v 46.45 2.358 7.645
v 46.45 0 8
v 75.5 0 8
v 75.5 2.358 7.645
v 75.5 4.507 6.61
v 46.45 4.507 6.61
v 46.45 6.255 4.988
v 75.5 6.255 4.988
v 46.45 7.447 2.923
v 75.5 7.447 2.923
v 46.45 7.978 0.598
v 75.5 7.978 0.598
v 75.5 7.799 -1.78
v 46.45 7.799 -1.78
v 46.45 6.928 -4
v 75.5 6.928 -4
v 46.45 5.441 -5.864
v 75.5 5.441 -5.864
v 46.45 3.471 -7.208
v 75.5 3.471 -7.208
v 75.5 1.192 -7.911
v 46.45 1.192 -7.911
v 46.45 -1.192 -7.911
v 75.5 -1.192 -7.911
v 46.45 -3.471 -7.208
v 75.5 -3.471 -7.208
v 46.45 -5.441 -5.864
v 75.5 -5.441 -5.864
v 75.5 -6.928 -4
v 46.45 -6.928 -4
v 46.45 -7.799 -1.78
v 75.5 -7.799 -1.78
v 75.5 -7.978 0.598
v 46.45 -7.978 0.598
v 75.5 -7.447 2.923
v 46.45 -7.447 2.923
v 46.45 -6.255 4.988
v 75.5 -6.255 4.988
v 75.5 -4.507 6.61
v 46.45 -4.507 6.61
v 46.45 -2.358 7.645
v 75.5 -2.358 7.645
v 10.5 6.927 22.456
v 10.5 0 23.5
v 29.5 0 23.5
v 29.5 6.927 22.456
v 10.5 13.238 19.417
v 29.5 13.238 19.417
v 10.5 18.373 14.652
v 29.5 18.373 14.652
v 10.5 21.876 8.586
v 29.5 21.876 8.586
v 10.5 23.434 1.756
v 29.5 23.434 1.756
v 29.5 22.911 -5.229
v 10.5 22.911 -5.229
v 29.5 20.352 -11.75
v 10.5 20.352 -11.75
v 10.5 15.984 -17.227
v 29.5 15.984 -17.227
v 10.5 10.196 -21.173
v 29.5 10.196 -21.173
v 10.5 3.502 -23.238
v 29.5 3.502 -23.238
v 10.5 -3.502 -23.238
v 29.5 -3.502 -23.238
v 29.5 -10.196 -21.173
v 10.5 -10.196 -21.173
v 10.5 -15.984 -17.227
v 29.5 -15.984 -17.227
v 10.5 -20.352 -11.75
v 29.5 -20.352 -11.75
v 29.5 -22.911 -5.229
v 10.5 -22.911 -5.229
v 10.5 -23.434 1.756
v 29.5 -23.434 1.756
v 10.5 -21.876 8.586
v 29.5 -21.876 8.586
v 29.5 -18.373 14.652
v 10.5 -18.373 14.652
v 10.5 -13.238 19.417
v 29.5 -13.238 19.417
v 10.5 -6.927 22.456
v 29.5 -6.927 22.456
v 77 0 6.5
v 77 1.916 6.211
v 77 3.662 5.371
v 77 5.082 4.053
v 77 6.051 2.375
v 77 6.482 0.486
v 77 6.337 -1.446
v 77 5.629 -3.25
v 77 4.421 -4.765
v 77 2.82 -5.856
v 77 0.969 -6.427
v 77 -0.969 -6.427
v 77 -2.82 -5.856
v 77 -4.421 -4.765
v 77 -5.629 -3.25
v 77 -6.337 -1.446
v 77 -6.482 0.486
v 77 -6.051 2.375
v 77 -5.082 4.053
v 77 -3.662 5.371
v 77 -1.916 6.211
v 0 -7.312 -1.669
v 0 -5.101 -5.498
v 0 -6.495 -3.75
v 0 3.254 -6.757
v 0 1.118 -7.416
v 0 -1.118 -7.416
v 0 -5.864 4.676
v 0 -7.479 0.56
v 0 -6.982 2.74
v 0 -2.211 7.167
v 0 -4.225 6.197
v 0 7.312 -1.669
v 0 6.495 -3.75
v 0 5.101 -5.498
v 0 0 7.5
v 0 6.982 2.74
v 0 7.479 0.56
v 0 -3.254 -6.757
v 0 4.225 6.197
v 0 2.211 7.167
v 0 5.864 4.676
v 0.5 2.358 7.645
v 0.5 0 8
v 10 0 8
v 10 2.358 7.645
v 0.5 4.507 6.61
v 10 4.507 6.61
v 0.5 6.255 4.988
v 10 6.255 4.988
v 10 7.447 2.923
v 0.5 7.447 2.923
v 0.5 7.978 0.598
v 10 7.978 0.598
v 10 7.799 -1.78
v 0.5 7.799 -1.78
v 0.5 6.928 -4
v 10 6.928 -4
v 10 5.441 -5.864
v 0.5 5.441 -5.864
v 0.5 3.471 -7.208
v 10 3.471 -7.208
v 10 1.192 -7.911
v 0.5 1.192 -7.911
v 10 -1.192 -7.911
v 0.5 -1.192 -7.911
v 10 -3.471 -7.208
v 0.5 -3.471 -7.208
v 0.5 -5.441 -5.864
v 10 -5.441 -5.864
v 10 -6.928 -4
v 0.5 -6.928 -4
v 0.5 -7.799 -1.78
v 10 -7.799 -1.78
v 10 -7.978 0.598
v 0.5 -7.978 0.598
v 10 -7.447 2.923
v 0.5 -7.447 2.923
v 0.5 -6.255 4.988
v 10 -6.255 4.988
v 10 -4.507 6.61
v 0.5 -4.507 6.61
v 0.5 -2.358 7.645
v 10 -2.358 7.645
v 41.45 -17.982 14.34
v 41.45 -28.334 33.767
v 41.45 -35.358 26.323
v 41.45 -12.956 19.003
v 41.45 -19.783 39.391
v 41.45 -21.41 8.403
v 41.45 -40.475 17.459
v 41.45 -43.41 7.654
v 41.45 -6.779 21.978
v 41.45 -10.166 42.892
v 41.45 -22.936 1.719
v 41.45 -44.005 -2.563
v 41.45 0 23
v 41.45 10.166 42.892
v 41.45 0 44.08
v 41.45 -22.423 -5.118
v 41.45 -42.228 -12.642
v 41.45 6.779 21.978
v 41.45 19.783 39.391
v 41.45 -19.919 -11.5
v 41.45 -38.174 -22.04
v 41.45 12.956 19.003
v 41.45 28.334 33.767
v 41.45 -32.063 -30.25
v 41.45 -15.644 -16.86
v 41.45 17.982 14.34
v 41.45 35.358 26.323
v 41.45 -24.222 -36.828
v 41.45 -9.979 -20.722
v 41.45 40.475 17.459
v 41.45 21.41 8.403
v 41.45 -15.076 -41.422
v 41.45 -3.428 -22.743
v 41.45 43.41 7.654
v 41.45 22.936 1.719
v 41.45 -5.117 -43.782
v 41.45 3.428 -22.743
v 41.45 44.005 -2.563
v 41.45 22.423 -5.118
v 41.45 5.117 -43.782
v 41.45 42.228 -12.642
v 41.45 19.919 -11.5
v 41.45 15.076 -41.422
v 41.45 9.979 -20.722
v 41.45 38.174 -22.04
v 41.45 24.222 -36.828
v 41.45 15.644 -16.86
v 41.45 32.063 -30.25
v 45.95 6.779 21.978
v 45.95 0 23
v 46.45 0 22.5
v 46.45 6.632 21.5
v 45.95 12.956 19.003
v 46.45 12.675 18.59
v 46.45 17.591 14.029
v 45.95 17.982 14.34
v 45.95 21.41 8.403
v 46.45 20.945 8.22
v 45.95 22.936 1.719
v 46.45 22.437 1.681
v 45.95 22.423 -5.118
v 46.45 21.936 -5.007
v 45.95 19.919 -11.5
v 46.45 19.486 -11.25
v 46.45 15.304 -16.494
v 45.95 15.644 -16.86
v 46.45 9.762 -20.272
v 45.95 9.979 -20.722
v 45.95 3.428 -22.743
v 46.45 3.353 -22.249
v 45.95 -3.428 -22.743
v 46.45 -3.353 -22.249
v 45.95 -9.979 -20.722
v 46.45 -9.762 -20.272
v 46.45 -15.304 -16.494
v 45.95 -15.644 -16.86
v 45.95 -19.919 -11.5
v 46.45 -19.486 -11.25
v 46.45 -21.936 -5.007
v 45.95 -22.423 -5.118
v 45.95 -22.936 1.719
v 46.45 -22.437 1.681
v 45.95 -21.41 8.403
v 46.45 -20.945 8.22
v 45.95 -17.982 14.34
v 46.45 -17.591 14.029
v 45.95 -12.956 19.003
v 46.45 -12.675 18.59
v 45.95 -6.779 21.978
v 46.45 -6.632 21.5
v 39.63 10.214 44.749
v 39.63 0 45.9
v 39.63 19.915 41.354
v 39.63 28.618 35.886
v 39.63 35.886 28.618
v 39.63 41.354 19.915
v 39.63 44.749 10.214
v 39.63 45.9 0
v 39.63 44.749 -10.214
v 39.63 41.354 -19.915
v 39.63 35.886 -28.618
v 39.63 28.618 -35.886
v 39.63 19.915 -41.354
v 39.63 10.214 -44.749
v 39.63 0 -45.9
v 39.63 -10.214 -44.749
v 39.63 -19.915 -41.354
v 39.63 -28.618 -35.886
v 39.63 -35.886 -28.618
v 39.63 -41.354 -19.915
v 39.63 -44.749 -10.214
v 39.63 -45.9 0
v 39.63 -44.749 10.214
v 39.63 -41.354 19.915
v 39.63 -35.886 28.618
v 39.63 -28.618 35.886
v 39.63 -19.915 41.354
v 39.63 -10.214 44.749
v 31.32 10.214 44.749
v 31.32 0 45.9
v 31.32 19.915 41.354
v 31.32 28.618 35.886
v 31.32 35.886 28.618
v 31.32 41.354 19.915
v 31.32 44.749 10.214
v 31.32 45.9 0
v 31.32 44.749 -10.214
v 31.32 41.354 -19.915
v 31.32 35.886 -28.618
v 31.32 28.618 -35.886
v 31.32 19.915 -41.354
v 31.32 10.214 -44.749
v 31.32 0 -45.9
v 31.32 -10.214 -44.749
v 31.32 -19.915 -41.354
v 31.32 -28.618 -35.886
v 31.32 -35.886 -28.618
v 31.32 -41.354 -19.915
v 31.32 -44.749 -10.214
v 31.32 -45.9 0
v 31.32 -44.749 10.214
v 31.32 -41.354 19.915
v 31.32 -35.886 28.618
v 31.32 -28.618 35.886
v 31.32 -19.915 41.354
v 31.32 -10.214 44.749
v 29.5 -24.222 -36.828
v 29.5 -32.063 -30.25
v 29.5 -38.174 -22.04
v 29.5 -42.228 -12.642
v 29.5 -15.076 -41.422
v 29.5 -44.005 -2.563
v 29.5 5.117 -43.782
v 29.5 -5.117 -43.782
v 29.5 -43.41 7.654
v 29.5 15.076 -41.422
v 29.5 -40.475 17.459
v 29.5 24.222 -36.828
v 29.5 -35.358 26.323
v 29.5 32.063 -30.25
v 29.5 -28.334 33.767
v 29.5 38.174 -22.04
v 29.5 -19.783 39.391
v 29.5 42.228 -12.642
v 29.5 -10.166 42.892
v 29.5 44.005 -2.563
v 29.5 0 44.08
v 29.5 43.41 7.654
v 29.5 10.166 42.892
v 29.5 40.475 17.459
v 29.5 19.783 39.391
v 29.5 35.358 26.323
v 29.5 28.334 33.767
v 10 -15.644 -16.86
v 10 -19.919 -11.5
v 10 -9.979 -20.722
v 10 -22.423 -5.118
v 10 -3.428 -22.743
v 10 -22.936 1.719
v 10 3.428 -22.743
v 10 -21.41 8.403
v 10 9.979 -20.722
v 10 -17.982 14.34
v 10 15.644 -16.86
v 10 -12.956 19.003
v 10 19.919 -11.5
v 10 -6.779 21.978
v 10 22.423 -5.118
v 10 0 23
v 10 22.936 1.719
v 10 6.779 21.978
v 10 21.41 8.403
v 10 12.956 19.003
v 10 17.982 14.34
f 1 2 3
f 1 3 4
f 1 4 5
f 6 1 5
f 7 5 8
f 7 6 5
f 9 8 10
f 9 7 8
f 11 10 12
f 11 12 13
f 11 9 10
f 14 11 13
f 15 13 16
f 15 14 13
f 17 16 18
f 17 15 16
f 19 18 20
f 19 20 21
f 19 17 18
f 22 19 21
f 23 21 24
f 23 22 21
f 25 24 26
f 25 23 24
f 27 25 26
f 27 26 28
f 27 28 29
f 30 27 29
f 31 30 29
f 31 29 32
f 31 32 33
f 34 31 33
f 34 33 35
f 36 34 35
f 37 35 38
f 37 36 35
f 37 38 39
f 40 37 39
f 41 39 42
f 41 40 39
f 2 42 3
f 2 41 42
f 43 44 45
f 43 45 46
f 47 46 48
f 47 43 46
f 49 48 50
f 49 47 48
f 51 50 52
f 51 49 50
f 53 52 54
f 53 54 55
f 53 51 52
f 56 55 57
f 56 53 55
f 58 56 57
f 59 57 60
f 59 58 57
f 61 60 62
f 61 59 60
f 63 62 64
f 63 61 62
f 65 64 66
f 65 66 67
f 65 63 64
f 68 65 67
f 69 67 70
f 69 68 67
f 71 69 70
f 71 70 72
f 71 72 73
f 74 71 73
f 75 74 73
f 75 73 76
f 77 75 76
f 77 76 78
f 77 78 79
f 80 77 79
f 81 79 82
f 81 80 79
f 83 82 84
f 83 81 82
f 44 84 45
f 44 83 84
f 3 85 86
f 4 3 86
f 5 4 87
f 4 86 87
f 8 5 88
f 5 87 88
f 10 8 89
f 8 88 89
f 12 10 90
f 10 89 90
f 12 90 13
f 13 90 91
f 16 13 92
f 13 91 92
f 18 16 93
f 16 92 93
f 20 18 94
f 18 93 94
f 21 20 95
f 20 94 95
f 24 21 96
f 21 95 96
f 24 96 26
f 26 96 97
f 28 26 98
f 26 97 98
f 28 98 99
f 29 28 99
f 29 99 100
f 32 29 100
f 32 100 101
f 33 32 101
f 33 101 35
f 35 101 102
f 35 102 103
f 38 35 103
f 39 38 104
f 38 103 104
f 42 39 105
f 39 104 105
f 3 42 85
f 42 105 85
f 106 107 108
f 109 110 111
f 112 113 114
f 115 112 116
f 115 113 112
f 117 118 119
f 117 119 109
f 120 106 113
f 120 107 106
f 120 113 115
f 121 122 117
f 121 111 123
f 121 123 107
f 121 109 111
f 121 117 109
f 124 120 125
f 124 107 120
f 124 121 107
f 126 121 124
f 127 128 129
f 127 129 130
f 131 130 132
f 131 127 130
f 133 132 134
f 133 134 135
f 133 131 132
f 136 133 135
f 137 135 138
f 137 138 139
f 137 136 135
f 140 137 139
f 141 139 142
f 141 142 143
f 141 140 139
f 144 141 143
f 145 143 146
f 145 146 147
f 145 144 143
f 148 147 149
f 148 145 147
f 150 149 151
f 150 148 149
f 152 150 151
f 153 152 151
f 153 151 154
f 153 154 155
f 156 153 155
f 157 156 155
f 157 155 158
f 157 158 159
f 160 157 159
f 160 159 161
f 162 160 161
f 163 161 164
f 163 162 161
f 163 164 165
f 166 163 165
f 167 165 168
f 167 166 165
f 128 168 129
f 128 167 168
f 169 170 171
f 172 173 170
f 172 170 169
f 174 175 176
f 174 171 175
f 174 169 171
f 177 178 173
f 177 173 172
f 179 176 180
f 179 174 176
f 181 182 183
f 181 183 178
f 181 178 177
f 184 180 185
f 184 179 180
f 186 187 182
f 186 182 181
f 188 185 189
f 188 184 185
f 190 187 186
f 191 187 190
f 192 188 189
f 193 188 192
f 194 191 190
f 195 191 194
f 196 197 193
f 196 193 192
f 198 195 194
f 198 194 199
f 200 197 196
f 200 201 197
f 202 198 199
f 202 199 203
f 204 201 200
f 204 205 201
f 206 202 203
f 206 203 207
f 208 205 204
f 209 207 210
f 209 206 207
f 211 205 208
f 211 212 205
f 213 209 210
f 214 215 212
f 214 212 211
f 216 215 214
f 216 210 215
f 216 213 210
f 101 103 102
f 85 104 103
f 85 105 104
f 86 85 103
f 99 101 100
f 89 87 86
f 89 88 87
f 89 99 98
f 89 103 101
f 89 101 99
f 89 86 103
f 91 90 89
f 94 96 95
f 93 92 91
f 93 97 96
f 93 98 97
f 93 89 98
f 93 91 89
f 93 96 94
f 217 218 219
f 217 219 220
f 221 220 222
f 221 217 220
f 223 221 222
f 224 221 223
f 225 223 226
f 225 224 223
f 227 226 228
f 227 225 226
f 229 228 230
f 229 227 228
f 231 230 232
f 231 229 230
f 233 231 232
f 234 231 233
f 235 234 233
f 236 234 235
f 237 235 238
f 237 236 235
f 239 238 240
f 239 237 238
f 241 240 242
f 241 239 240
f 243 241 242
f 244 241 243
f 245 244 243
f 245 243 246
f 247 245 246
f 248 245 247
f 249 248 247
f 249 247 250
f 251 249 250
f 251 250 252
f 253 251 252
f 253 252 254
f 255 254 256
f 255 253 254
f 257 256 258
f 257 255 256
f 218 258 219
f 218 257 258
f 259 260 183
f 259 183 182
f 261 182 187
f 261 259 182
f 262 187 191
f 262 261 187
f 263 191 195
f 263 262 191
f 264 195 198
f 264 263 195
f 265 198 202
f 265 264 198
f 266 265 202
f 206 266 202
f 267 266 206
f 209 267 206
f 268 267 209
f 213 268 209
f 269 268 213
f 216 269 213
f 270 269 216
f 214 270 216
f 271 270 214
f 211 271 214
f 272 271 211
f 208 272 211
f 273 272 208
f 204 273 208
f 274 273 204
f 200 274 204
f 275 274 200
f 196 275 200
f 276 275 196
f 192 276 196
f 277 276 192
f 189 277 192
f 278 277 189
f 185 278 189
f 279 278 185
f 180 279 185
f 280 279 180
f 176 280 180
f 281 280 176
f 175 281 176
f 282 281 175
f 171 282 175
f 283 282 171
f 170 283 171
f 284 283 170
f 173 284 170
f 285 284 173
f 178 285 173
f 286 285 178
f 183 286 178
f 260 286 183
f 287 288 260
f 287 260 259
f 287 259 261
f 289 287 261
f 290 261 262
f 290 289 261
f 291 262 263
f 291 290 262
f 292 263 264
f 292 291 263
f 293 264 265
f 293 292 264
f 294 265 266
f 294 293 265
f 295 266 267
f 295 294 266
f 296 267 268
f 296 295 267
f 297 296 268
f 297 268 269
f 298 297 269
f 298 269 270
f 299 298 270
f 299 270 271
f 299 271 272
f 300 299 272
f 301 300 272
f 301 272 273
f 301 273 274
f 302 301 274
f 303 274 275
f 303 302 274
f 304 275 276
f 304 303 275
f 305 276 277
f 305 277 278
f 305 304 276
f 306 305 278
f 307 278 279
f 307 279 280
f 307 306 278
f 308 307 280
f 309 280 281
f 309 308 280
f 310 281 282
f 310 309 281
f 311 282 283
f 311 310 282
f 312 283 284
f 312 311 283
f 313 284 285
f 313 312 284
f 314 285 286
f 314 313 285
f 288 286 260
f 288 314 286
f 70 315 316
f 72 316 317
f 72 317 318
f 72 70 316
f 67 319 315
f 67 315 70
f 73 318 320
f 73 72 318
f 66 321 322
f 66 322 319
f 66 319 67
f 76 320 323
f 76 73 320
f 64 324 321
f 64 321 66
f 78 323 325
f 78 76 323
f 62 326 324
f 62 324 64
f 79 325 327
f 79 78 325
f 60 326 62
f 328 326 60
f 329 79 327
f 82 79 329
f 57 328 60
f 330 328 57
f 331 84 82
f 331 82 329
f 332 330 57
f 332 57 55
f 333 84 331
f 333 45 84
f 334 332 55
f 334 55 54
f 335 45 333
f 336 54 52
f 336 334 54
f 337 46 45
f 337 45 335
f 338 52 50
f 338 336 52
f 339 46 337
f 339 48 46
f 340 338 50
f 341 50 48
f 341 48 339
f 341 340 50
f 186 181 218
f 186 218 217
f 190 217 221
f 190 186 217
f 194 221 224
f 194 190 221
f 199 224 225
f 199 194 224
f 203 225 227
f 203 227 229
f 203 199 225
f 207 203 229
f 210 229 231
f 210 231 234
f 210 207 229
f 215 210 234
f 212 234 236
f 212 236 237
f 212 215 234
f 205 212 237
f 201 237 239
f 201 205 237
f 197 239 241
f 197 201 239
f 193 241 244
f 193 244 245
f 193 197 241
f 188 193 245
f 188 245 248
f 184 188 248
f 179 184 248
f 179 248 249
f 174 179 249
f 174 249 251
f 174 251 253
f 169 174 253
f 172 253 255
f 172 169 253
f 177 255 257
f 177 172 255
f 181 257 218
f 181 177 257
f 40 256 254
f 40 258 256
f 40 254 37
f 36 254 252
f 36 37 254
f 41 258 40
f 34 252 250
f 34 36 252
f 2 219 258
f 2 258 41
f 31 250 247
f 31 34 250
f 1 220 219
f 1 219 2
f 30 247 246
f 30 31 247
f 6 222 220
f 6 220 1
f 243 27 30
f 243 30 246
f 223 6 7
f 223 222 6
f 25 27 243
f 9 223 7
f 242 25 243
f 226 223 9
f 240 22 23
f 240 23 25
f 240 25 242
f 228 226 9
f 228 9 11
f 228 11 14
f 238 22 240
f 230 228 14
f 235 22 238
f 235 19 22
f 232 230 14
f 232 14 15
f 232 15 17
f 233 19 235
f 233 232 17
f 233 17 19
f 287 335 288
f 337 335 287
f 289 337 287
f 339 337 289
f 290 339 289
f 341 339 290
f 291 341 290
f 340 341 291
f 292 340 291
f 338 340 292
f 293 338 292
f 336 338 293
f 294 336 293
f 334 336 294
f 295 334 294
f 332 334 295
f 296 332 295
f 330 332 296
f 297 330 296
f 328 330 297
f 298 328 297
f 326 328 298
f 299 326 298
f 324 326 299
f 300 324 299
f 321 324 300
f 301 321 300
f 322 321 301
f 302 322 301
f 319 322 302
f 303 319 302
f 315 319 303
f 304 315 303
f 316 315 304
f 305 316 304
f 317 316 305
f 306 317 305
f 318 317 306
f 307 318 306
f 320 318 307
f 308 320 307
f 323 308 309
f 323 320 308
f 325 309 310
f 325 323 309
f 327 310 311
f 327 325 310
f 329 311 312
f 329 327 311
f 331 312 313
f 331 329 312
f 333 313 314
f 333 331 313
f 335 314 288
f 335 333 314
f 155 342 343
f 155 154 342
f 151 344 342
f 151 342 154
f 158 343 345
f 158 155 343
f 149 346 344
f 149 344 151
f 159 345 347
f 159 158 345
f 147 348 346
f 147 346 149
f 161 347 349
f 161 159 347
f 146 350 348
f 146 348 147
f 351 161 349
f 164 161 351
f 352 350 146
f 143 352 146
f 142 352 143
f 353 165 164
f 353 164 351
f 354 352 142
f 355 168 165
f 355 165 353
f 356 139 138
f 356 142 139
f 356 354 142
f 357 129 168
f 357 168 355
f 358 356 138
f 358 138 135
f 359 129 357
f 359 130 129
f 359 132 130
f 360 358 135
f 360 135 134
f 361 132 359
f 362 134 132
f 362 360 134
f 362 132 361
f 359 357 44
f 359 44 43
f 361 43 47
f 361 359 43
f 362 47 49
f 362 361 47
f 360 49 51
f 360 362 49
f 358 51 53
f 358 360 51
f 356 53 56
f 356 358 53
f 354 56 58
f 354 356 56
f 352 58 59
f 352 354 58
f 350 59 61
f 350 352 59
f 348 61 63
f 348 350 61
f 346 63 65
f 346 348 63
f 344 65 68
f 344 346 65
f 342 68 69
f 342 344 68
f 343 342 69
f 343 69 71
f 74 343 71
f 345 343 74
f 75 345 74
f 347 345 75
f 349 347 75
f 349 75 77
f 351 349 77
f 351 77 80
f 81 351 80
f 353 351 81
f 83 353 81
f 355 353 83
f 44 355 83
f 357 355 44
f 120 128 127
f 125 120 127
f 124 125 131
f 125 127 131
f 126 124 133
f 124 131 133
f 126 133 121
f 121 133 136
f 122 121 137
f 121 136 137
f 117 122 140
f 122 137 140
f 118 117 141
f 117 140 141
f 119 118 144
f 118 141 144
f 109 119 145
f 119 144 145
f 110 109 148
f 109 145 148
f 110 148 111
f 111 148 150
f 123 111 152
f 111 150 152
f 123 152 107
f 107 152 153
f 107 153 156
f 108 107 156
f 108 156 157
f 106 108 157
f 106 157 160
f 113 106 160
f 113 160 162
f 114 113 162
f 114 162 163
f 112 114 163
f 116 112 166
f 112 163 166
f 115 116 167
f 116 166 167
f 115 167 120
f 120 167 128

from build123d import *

# Parameters (mm, degrees)
F2_SIZE = 0.5
F3_SIZE = 1.5
F4_SIZE = 1.82


with BuildPart() as f1:
    # F0 (on Front) → F1 (revolve)
    with BuildSketch(Plane.XZ):
        Polygon((0, 8), (0, 0), (77, 0), (77, 8), (46.45, 8), (46.45, 23), (41.45, 23), (41.45, 45.9), (29.5, 45.9), (29.5, 23.5), (10, 23.5), (10, 8), align=None)
    revolve(axis=Axis((38.5, 0, 0), (-1, 0, 0)))

    # F2
    f2_edges = [f1.edges().sort_by_distance(p)[0] for p in [
        (0, 0, -8),
        (10, 0, -23.5),
        (46.45, 0, -23),
    ]]
    chamfer(f2_edges, length=F2_SIZE)

    # F3
    f3_edges = [f1.edges().sort_by_distance(p)[0] for p in [
        (77, 0, -8),
    ]]
    chamfer(f3_edges, length=F3_SIZE)

    # F4
    f4_edges = [f1.edges().sort_by_distance(p)[0] for p in [
        (41.45, 0, -45.9),
        (29.5, 0, -45.9),
    ]]
    chamfer(f4_edges, length=F4_SIZE)


solid = f1.part
